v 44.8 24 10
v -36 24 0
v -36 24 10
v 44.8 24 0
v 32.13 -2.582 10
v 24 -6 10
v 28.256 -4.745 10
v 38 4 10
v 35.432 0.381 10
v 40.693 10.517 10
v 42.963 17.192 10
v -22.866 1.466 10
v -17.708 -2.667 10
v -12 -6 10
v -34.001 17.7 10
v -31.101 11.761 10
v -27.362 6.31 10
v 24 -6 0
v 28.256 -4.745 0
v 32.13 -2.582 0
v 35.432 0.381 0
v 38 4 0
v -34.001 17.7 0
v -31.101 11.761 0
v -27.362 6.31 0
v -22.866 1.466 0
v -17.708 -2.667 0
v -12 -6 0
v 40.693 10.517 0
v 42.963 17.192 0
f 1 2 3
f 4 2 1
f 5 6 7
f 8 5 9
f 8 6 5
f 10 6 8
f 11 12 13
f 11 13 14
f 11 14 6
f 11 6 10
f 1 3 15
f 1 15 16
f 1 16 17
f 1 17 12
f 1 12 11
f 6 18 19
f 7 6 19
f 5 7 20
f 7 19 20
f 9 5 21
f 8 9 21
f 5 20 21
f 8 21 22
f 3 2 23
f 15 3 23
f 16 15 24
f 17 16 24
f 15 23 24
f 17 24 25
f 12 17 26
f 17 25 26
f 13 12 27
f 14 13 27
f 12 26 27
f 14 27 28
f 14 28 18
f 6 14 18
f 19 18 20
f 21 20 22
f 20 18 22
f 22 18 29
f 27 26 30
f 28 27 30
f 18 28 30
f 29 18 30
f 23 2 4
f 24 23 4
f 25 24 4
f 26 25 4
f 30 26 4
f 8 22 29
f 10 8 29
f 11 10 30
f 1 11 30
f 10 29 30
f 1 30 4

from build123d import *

# Parameters (mm, degrees)
PAD_DEPTH = 10


with BuildPart() as part:
    # Sketch001 → Pad (new body)
    with BuildSketch(Plane.XY):
        with BuildLine():
            ThreePointArc((24, -6), (32.130235, -2.582329), (38, 4))
            ThreePointArc((38, 4), (41.881212, 13.836388), (44.8, 24))
            Line((-36, 24), (44.8, 24))
            ThreePointArc((-36, 24), (-27.362437, 6.310051), (-12, -6))
            Line((-12, -6), (24, -6))
        make_face()
    extrude(amount=PAD_DEPTH)


solid = part.part
